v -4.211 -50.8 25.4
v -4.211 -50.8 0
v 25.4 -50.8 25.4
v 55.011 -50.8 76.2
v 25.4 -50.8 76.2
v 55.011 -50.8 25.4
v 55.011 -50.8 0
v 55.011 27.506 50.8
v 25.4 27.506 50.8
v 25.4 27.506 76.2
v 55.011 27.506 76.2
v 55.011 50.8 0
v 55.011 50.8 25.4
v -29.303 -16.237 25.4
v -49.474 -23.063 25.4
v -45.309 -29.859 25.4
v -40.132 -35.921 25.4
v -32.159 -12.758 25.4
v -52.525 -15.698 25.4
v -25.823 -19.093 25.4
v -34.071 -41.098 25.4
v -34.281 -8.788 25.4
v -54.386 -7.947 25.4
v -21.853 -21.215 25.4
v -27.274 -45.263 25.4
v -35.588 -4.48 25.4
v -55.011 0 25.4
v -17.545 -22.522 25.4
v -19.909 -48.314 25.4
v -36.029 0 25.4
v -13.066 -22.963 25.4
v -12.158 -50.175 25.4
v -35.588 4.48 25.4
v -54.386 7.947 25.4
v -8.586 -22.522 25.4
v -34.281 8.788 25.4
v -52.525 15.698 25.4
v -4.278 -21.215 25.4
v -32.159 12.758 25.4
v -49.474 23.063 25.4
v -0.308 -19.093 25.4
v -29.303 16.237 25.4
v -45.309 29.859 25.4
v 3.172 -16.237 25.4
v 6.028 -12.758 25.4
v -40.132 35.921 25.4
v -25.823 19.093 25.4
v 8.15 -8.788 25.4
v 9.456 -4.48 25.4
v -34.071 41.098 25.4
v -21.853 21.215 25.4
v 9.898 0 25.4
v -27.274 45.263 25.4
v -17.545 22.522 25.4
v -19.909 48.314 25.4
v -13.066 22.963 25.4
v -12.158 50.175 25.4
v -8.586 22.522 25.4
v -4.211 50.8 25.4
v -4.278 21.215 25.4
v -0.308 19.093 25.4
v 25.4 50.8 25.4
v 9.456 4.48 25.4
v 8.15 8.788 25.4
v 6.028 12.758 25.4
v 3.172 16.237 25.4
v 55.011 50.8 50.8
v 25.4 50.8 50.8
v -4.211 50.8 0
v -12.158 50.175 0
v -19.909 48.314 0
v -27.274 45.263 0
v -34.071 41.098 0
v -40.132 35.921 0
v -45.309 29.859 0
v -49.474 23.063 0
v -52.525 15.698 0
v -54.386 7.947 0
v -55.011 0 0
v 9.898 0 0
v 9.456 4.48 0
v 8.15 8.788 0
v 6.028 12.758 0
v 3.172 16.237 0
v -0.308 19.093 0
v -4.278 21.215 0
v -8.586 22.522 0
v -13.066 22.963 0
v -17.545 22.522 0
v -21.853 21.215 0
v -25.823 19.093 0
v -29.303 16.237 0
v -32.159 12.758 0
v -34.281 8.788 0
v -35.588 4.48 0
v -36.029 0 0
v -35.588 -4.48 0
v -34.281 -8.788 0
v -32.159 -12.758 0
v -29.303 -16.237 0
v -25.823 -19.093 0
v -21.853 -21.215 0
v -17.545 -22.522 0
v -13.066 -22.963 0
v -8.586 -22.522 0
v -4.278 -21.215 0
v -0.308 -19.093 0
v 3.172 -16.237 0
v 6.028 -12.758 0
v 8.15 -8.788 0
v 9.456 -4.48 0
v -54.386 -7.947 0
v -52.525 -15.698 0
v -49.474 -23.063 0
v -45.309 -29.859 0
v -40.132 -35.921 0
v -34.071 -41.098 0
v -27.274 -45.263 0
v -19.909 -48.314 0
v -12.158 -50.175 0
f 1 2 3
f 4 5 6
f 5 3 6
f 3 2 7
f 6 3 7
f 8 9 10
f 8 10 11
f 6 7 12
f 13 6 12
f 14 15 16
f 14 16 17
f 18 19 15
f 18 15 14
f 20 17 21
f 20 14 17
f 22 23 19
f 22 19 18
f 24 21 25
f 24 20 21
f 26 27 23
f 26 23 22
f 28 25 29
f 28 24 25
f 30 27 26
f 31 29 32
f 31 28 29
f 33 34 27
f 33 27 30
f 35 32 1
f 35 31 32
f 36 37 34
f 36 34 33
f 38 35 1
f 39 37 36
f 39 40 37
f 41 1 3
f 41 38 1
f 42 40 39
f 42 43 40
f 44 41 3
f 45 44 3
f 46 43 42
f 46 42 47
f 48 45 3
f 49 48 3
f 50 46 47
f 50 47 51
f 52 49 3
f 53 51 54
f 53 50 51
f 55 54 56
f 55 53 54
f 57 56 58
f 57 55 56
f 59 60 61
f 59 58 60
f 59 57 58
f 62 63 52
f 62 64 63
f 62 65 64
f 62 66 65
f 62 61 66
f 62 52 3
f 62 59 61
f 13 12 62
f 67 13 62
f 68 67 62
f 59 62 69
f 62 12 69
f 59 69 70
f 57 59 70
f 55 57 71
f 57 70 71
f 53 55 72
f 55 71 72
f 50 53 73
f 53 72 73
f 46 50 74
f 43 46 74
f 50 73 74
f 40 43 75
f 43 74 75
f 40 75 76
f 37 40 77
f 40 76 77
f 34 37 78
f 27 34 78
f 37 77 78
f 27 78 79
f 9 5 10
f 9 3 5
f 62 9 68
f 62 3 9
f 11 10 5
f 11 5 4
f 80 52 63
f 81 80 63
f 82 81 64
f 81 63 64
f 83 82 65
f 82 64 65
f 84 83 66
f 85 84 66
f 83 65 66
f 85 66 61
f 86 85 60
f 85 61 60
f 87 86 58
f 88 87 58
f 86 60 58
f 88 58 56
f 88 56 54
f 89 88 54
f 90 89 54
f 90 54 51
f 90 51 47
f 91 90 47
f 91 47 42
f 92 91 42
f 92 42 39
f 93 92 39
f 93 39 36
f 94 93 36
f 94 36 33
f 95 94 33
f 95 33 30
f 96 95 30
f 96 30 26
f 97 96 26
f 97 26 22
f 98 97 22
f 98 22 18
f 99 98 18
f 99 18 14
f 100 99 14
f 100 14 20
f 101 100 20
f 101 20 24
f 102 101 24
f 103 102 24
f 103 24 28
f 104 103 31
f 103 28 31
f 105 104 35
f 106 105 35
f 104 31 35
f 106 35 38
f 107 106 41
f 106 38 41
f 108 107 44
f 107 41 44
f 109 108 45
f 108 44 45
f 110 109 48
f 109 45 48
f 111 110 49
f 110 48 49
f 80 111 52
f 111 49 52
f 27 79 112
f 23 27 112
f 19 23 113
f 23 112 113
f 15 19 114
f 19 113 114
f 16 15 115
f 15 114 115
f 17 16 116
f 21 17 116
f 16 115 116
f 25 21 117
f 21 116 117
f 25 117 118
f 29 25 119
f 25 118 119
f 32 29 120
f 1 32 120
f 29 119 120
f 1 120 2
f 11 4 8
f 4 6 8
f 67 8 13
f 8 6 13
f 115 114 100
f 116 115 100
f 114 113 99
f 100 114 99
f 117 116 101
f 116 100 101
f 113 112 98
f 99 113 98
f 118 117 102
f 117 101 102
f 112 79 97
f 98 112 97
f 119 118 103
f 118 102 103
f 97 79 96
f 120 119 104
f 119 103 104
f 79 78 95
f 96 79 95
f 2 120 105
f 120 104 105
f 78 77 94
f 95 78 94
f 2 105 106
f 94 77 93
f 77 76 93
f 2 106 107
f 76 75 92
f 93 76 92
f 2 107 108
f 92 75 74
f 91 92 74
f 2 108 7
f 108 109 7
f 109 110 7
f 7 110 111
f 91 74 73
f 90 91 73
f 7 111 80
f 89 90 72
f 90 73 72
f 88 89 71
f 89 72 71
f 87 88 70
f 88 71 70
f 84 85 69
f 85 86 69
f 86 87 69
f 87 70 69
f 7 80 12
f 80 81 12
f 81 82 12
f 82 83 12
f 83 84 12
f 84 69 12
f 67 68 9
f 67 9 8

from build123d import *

# Parameters (mm, degrees)
F1_DEPTH = 25.4
F2_R     = 22.963288
F3_DEPTH = 25.401
F4_W     = 29.611313
F4_H     = 101.6
F5_DEPTH = 25.4
F6_W     = 29.611313
F6_H     = 78.306478
F7_DEPTH = 25.4


with BuildPart() as f1:
    # F0 (on Top) → F1 (new body)
    with BuildSketch(Plane.XY):
        with BuildLine():
            Line((-4.211313, -50.8), (55.011313, -50.8))
            Line((55.011313, -50.8), (55.011313, 50.8))
            Line((55.011313, 50.8), (-4.211313, 50.8))
            ThreePointArc((-4.211313, 50.8), (-40.132338, 35.921024), (-55.011313, 0))
            ThreePointArc((-55.011313, 0), (-40.132338, -35.921024), (-4.211313, -50.8))
        make_face()
    extrude(amount=F1_DEPTH)

    # F2 (on face) → F3 (cut, through all)
    with BuildSketch(Plane.XY.offset(25.4)):
        with Locations((-13.065578, 0)):
            Circle(F2_R)
    extrude(amount=-F3_DEPTH, mode=Mode.SUBTRACT)

    # F4 (on face) → F5 (join)
    with BuildSketch(Plane.XY.offset(25.4)):
        with Locations((40.205656, 0)):
            Rectangle(F4_W, F4_H)
    extrude(amount=F5_DEPTH)

    # F6 (on face) → F7 (join)
    with BuildSketch(Plane.XY.offset(50.8)):
        with Locations((40.205656, -11.646761)):
            Rectangle(F6_W, F6_H)
    extrude(amount=F7_DEPTH)


solid = f1.part
